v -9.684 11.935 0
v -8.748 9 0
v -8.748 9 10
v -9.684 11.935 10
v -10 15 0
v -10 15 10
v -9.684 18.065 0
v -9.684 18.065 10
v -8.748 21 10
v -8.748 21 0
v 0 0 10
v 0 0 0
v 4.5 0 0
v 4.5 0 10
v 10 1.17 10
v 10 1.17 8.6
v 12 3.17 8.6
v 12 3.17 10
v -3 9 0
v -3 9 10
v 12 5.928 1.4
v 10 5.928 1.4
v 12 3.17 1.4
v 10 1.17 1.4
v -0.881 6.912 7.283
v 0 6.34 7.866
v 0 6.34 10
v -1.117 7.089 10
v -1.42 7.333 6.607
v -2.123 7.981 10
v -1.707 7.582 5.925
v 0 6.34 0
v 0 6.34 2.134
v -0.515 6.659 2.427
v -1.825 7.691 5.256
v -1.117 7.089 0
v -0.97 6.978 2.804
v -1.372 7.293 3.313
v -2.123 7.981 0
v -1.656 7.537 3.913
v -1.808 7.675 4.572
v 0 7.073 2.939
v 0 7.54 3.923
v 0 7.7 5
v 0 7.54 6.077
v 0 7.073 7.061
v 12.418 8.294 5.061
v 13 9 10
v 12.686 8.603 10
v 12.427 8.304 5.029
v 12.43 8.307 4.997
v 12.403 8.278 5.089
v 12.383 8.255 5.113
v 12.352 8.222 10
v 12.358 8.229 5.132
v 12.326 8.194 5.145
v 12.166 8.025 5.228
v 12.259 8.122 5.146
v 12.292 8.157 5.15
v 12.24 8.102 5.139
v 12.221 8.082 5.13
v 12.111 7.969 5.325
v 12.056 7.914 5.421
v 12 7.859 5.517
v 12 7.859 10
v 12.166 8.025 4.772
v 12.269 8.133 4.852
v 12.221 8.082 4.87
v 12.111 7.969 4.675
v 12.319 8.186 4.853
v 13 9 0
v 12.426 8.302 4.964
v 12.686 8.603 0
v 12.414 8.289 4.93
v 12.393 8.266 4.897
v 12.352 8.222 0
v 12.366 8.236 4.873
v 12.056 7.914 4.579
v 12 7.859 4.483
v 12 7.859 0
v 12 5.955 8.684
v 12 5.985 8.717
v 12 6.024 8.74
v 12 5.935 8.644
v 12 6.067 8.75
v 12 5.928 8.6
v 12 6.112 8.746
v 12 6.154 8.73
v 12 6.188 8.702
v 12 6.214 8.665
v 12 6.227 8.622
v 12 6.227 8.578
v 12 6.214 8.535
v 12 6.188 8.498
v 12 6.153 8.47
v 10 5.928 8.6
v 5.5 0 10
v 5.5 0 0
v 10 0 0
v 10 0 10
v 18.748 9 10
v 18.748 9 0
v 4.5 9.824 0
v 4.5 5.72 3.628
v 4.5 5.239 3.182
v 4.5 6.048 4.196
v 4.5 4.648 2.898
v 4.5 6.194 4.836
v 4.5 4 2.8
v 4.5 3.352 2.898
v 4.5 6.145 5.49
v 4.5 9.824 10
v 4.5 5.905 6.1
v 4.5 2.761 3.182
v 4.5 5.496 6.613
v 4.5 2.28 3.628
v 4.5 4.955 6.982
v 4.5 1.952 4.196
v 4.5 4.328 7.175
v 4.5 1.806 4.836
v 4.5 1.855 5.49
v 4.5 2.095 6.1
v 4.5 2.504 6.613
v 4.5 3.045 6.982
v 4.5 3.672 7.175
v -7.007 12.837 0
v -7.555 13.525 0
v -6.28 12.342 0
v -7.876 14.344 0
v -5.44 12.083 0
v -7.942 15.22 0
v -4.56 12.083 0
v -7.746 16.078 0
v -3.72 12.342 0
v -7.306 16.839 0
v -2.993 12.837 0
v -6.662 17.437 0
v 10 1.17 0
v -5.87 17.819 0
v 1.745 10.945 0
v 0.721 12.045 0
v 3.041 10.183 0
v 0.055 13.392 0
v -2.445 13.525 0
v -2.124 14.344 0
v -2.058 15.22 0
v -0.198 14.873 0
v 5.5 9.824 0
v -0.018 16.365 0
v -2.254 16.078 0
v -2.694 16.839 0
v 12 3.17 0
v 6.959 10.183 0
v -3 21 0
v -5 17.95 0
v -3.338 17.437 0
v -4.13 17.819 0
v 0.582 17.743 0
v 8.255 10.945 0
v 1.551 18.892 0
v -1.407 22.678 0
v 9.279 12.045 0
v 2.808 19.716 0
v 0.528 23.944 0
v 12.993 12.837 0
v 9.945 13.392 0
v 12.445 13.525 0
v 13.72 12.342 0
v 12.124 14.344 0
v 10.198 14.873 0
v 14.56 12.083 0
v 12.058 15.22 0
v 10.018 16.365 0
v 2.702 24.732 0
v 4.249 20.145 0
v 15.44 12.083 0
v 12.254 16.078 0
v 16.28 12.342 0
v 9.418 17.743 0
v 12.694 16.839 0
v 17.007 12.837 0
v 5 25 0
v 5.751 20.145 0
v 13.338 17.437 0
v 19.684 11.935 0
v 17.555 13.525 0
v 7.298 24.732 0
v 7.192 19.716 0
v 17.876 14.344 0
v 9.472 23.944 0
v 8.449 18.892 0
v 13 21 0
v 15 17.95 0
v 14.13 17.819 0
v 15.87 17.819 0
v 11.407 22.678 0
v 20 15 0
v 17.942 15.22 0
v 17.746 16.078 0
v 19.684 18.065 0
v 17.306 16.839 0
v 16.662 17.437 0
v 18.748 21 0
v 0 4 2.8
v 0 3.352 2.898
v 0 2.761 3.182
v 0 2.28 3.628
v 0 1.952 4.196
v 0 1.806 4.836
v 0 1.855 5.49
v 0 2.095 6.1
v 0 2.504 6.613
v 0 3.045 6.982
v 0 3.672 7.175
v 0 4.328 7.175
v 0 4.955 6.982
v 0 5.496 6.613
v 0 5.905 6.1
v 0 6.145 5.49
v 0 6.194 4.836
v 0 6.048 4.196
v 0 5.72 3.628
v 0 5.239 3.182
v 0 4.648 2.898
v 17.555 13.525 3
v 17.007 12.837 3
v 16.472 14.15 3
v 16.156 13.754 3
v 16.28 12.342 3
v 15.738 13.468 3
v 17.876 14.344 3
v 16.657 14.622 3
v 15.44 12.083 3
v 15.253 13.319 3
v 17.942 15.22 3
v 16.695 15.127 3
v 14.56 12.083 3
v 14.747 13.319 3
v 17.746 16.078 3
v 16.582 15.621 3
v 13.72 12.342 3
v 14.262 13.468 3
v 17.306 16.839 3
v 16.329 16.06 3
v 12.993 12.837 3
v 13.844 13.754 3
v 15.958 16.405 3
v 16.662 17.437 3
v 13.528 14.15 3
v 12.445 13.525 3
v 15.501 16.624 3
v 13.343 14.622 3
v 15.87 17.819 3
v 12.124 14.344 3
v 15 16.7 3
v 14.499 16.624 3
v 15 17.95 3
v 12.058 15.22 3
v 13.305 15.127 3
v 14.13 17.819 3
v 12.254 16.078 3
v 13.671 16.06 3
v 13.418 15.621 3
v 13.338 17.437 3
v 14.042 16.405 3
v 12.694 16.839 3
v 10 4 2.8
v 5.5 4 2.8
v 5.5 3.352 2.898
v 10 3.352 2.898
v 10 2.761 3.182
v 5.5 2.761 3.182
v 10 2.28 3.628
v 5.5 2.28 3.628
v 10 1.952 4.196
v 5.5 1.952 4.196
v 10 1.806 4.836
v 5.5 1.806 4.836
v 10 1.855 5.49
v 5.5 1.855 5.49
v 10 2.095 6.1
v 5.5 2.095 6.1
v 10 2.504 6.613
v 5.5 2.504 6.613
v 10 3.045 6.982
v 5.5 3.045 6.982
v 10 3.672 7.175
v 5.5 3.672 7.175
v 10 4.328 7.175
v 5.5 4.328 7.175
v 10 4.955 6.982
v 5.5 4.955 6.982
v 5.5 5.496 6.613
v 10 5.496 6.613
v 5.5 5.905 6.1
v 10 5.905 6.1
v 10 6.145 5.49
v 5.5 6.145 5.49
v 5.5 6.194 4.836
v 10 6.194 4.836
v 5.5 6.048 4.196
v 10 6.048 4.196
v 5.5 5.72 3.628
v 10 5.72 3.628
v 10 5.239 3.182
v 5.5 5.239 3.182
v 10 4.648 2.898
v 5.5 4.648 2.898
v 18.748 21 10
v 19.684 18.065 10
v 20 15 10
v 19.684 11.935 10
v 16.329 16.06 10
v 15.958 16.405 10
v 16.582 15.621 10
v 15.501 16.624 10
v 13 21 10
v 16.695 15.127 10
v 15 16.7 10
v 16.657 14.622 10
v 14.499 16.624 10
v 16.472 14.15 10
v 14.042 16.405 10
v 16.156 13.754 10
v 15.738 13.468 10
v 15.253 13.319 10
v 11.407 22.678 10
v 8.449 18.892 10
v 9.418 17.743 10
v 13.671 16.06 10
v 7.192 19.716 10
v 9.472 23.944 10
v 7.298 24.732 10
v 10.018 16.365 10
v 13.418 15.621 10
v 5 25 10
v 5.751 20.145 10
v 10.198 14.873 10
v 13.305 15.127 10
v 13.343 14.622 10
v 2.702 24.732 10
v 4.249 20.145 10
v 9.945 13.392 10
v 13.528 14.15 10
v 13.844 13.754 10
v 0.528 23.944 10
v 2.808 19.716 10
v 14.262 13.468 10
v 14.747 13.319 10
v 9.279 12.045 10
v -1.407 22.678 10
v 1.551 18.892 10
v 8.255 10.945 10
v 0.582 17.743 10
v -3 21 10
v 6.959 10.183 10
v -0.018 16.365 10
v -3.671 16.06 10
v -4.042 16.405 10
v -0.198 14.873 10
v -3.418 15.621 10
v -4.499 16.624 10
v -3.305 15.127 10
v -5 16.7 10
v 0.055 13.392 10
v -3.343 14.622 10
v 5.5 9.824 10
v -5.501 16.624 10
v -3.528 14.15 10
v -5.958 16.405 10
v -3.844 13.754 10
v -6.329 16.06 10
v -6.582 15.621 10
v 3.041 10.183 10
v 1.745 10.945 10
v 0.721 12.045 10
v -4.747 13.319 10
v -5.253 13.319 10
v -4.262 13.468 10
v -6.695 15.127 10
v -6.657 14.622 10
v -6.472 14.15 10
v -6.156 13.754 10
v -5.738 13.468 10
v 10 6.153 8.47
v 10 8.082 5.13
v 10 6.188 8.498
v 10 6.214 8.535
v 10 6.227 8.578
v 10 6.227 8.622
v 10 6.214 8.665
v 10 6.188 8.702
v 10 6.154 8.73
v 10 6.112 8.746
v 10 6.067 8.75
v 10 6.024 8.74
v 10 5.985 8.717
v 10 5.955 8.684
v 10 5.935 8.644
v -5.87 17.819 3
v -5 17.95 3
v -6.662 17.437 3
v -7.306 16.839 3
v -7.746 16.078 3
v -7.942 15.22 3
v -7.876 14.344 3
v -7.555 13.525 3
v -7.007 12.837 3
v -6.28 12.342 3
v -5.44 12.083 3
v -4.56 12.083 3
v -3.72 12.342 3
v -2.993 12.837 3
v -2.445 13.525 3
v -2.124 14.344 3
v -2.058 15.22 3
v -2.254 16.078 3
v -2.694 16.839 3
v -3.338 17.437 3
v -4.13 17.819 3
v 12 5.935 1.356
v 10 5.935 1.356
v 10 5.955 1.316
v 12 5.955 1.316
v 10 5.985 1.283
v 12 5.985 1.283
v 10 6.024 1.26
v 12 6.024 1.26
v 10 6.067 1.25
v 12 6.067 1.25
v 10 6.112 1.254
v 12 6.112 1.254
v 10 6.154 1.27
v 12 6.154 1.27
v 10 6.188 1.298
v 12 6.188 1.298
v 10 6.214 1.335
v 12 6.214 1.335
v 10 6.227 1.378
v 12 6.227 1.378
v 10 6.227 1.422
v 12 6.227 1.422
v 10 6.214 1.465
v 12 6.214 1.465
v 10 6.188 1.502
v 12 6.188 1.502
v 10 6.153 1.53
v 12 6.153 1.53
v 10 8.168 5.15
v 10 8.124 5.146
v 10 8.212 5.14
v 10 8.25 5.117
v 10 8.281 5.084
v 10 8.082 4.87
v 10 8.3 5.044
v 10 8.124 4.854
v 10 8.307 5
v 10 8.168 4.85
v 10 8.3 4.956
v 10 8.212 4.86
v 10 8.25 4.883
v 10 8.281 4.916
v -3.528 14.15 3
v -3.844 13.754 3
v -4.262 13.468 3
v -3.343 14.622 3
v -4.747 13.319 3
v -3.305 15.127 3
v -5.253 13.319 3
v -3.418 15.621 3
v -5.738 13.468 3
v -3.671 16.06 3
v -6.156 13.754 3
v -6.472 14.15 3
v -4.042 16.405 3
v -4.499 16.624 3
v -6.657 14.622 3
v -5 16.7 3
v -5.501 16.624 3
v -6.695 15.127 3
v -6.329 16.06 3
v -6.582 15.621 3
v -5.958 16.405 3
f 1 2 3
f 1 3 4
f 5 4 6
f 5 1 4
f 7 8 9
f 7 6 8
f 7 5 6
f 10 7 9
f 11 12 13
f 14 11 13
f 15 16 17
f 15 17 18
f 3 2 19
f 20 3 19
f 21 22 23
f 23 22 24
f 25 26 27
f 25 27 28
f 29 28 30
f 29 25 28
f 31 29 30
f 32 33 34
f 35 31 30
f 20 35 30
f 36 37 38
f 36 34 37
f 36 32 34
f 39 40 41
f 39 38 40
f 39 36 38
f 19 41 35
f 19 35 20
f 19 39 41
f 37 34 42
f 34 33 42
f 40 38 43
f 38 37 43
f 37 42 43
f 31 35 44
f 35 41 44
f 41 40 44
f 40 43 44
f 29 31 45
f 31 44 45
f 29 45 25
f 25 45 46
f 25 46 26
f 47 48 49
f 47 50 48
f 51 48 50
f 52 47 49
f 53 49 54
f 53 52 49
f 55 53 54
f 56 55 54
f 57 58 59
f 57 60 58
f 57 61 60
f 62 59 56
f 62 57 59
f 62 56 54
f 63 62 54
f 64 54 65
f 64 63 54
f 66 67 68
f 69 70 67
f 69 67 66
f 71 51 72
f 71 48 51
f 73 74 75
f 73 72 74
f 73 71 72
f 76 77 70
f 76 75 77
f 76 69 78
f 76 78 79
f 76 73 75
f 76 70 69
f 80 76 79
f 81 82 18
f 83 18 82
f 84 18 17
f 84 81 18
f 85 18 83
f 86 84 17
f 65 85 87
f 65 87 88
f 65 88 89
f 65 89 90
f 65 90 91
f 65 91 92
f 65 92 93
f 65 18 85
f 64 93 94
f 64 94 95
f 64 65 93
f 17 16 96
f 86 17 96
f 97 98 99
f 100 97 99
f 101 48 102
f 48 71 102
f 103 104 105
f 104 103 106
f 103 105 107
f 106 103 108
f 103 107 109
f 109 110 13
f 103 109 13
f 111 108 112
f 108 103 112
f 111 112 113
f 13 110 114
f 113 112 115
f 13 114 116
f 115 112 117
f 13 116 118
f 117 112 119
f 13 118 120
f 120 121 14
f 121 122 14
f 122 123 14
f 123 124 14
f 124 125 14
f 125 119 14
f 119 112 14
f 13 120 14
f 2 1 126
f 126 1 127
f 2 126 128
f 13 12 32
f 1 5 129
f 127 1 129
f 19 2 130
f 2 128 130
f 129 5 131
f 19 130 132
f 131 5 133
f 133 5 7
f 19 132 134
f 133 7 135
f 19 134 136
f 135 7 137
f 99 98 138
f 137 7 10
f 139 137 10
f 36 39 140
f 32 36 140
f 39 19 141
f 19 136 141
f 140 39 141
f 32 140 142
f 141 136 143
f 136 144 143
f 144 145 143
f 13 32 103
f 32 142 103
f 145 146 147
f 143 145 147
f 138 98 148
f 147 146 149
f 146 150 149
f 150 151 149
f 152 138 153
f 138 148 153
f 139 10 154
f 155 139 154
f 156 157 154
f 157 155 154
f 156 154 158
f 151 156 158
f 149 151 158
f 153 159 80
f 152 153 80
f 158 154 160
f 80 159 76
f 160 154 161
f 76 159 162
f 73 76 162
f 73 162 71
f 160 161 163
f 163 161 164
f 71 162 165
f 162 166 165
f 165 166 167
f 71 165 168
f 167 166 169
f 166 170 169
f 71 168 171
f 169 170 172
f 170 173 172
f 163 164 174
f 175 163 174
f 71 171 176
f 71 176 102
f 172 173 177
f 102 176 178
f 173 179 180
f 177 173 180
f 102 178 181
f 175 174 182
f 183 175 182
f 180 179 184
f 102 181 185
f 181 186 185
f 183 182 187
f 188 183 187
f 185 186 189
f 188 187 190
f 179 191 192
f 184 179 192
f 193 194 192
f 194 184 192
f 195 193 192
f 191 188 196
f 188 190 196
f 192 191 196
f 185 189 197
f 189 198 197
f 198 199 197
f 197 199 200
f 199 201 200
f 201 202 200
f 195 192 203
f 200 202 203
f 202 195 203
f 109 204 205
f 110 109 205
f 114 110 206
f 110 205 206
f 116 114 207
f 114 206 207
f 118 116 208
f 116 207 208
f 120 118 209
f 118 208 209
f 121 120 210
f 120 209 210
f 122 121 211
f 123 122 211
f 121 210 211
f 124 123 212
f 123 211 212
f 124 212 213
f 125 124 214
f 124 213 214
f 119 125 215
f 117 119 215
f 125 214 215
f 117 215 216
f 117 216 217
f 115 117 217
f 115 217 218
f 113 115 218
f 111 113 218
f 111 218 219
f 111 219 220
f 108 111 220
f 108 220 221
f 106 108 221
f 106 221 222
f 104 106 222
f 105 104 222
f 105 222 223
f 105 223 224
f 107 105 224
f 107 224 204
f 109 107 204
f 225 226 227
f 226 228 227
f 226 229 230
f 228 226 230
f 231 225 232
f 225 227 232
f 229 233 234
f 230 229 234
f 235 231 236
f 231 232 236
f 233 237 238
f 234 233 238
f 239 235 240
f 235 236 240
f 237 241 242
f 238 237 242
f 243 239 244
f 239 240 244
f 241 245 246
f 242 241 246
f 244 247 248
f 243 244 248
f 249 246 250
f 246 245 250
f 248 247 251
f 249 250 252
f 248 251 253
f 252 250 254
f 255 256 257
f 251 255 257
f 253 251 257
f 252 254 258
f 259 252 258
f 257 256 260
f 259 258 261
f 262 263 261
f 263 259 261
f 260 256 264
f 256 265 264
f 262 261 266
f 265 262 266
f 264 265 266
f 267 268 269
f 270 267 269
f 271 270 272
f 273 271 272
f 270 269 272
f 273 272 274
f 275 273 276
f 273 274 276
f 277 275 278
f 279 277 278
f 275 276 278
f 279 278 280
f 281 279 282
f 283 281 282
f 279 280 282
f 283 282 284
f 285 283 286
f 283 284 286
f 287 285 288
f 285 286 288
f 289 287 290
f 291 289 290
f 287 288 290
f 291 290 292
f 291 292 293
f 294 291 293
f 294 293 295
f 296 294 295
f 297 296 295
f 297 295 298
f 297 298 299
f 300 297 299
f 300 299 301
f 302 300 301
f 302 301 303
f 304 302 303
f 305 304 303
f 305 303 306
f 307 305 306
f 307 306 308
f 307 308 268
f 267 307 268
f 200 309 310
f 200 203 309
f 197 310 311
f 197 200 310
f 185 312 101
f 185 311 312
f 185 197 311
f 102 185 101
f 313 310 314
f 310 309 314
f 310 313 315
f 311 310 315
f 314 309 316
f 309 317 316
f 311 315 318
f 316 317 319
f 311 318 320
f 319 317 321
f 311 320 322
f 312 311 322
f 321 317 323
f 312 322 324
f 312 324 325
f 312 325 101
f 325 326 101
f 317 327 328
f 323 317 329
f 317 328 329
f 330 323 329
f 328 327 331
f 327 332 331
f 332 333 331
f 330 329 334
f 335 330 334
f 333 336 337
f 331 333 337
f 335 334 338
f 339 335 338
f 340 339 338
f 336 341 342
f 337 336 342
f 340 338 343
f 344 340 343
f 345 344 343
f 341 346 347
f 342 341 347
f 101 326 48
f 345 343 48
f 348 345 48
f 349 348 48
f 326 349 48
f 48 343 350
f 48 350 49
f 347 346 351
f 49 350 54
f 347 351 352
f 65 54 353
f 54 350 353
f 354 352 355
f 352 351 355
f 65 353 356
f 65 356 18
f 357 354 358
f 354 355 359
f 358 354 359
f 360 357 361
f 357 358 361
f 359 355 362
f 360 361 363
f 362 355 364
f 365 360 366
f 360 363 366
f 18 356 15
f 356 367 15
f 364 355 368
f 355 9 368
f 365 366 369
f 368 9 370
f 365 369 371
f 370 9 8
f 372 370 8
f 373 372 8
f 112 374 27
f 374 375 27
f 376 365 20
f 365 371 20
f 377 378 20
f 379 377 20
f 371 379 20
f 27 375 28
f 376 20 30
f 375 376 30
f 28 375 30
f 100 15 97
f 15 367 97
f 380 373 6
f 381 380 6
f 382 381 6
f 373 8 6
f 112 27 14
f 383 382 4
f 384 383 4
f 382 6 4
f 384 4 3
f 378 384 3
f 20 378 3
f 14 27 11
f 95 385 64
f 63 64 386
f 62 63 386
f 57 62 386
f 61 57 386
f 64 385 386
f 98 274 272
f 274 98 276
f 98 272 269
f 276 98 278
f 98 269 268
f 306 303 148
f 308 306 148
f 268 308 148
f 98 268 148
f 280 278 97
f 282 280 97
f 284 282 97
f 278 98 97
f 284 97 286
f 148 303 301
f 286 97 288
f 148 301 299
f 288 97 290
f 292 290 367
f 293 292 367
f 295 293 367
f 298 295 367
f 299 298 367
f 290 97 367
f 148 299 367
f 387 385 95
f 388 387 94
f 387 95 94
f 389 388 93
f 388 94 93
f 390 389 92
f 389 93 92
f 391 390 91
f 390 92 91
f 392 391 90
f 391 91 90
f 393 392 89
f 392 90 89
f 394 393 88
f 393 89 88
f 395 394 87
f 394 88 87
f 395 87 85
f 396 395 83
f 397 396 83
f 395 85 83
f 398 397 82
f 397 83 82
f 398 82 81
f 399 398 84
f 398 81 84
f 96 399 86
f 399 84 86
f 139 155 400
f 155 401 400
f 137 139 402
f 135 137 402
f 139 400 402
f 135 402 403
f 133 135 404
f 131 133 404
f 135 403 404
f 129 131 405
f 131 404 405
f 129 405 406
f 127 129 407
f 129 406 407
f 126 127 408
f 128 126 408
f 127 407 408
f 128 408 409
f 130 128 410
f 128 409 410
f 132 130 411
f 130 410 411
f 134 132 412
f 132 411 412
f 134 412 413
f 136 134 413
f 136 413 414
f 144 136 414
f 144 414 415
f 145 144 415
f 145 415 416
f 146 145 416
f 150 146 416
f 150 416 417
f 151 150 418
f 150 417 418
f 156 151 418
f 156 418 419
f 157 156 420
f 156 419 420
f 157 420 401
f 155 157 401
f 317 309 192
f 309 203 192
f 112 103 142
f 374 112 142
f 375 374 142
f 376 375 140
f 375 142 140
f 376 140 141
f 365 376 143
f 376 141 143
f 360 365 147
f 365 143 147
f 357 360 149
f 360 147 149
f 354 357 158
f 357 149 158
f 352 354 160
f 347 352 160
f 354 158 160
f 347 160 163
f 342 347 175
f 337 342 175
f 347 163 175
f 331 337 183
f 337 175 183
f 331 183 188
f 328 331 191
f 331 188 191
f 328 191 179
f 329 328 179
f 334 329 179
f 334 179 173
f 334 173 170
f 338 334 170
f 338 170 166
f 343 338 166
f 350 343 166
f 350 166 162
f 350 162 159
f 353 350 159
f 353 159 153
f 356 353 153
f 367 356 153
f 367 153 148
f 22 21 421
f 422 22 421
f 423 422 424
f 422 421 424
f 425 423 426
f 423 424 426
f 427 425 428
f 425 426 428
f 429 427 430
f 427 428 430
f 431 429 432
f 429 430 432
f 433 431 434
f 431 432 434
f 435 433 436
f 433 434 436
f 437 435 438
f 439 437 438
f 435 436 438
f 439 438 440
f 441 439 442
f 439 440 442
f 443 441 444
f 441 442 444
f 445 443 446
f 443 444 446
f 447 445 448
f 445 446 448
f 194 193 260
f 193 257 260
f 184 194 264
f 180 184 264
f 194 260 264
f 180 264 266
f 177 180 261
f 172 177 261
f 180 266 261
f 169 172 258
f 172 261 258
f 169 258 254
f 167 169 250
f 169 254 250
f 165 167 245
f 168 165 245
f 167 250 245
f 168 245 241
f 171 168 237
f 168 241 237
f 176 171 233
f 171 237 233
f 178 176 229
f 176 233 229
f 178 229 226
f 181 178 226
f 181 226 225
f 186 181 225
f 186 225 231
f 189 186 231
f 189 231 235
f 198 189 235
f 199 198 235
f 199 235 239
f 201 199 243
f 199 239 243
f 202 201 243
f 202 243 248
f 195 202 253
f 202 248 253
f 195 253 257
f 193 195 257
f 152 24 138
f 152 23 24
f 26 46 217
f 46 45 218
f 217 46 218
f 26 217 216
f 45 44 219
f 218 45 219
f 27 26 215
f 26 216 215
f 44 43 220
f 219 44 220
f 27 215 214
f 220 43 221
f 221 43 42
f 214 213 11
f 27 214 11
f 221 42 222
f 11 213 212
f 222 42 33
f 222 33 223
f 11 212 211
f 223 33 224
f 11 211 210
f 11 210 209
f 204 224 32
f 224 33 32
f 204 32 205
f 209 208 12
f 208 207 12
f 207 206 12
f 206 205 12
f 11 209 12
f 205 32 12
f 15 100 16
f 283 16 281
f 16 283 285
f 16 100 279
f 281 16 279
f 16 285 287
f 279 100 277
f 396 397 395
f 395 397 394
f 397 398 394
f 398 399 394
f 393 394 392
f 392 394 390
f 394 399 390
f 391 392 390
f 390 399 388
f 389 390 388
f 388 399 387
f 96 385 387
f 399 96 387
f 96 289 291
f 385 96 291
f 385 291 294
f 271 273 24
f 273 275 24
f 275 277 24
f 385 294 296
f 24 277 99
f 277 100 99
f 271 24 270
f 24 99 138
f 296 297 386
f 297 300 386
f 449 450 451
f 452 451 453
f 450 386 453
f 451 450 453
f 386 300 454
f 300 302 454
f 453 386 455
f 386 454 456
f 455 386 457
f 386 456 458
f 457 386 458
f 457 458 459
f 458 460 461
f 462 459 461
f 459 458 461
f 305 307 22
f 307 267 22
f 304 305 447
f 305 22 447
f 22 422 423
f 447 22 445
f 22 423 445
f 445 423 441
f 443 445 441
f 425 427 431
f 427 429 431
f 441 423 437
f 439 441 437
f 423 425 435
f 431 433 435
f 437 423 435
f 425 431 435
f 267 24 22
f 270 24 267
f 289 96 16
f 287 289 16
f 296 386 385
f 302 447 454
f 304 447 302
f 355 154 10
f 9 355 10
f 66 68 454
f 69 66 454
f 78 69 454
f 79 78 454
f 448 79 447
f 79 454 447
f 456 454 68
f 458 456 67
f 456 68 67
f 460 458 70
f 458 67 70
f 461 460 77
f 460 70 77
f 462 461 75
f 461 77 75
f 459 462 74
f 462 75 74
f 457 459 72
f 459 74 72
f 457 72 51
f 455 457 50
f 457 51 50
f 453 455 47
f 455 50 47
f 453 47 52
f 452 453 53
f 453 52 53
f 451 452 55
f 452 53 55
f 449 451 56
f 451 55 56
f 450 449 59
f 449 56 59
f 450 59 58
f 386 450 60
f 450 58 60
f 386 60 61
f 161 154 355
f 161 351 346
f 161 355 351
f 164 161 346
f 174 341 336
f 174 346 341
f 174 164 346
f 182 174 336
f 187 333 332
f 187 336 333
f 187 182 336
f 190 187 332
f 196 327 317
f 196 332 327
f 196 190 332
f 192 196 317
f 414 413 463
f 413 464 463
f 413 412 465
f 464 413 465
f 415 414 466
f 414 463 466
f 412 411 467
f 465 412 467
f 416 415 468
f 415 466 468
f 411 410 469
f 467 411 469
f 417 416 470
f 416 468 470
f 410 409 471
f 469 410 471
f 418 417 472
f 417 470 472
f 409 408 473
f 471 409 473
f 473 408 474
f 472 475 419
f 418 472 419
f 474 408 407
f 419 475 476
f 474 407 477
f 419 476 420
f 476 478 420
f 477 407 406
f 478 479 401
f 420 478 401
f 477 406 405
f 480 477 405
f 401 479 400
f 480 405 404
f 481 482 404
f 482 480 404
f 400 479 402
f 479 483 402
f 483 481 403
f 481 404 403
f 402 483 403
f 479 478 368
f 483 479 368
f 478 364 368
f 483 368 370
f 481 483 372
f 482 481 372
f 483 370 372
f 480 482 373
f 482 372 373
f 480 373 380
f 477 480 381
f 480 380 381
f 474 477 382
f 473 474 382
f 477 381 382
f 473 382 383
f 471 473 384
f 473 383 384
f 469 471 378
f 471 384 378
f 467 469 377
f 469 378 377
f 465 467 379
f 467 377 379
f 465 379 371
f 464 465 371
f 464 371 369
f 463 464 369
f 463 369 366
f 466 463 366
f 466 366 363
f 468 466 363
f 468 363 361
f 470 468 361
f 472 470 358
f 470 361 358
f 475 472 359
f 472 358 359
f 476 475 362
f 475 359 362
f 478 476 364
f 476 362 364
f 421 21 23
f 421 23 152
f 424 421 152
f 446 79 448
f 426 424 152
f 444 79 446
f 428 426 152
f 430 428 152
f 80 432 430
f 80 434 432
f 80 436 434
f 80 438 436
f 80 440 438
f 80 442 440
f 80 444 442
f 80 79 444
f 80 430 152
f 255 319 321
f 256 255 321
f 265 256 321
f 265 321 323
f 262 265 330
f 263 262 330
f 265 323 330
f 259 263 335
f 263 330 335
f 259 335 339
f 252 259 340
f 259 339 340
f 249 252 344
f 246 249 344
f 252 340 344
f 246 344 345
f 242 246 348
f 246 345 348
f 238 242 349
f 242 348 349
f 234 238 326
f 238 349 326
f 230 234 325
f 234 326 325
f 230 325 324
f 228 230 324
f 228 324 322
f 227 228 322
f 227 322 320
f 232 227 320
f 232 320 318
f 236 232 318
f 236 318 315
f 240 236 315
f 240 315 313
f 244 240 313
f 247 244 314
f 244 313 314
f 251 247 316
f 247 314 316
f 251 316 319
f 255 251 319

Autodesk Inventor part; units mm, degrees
ref_plane "YZ Plane" through (0, 0, 0) normal (1, 0, 0) x (0, 1, 0)
ref_plane "XZ Plane" through (0, 0, 0) normal (0, 1, 0) x (-1, 0, 0)
ref_plane "XY Plane" through (0, 0, 0) normal (0, 0, 1) x (1, 0, 0)
sketch "スケッチ1" plane through (0, 0, 0) normal (0, 0, 1) x (1, 0, 0)
  line L0 (0, 0) -> (10, 0)
  line L1 (10, 0) -> (10, 15)
  line L2 (10, 15) -> (0, 15)
  line L3 (0, 15) -> (0, 0)
  circle A0 centre (5, 15) radius 10
  circle A1 centre (5, 15) radius 15
  line L4 (-8.7477, 9) -> (18.7477, 9)
  line L5 (18.7477, 9) -> (18.7477, 21)
  line L6 (18.7477, 21) -> (-8.7477, 21)
  line L7 (-8.7477, 21) -> (-8.7477, 9)
  line L8 (-8.7477, 9) -> (18.7477, 21) construction
  line L9 (18.7477, 9) -> (-8.7477, 21) construction
  point P0 (0, 6.3397)
  point P1 (10, 6.3397)
  point P2 (-8.7477, 9)
  point P3 (-3, 9)
  point P4 (-3, 21)
  point P5 (-8.7477, 21)
  point P6 (13, 21)
  point P7 (13, 9)
  point P8 (18.7477, 9)
  point P9 (10, 9)
  point P10 (0, 9)
  point P11 (-8.7477, 9)
  point P12 (-8.7477, 21)
  point P13 (18.7477, 9)
  point P14 (10, 0.8579)
  point P15 (0, 0.8579)
  point P16 (5, 0)
  dimension "d41" = 30
  dimension "d0" = 15
  dimension "d1" = 20
  dimension "d27" = 10
  dimension "d28" = 5
  dimension "d42" = 12
extrude "押し出し1" add sketch "スケッチ1" along normal blind 10 contours L3 A1 L0 | A1 L1 L0 | A1 L3 A0 L1 | A0 L4 L3 | L3 L4 L1 A0 | L7 L6 A0 L4 | A1 L7 | L1 L4 A0 | L5 A1 | L4 A0 L6 L5 | L4 A0 L6 L1 L2 L3 | L3 L2 L1 L4 | A0 L6
sketch "スケッチ2" plane through (0, 0, 10) normal (0, 0, 1) x (1, 0, 0)
  arc A0 (10, 6.3397) -> (0, 6.3397) centre (5, 15) ccw projected
  point P0 (0, 0)
  point P1 (5, 15)
hole "穴1" at (5, 15, 10) direction (0, 0, -1) diameter 10.4 end through all
sketch "スケッチ3" plane through (0, 0, 10) normal (0, 0, 1) x (1, 0, 0)
  line L0 (0, 0) -> (10, 0) projected
  line L1 (4.5, 0) -> (5.5, 0)
  line L2 (5.5, 0) -> (5.5, 15)
  line L3 (5.5, 15) -> (4.5, 15)
  line L4 (4.5, 15) -> (4.5, 0)
  line L5 (0, 6.3397) -> (0, 0) projected
  circle A0 centre (5, 15) radius 5.2 projected
  point P0 (5, 0)
  point P1 (5, 0)
  dimension "d14" = 1
extrude "押し出し2" cut sketch "スケッチ3" against normal up to surface (10 mm away) contours L4 A0 L2 L0 | L4 L3 L2 A0 picked at (5.0556, 13.2676)
sketch "スケッチ4" plane through (10, 0, 0) normal (1, 0, 0) x (0, 0, -1)
  circle A0 centre (-5, 4) radius 1.5
  line L0 (0, 0) -> (-10, 0) projected
  line L1 (0, 0) -> (0, 6.3397) projected
  line L2 (-5, 0) -> (-5, 10)
  point P0 (0, 10)
  dimension "d17" = 4
  dimension "d19" = 3
hole "穴2" at (10, 4, 5) direction (-1, 0, 0) diameter 4.4 end through all
sketch "スケッチ7" plane through (10, 0, 0) normal (1, 0, 0) x (0, 0, -1)
  circle A0 centre (-5, 4) radius 2.2 projected
  line L0 (-5, 8.1569) -> (-1.4, 6.0785)
  line L1 (-1.4, 6.0785) -> (-1.4, 1.9215)
  line L2 (-1.4, 1.9215) -> (-5, -0.1569)
  line L3 (-5, -0.1569) -> (-8.6, 1.9215)
  line L4 (-8.6, 1.9215) -> (-8.6, 6.0785)
  line L5 (-8.6, 6.0785) -> (-5, 8.1569)
  line L6 (-10, 9.8241) -> (-10, 0) projected
  line L7 (0, 0) -> (0, 6.3397) projected
  line L8 (-10, 9.8241) -> (0, 9.8241)
  line L9 (0, 9.8241) -> (0, 3.1699)
  line L10 (0, 3.1699) -> (-10, 3.1699)
  line L11 (-10, 3.1699) -> (-10, 9.8241)
  point P0 (-1.4, 3.1699)
  point P1 (0, 6.3397)
  point P2 (-8.6, 3.1699)
  point P3 (-7.0374, 3.1699)
  point P4 (-2.9626, 3.1699)
  dimension "d35" = 7.2
extrude "押し出し5" add sketch "スケッチ7" along normal blind 2 contours L10 L6 L8 L9 L7 L1 L0 L5 L4
chamfer "面取り1" distance 2 angle 45 2 edges at (10, 3.1699, 9.3) (10, 3.1699, 0.7)
sketch "スケッチ8" plane through (0, 0, 0) normal (0, 0, -1) x (-1, 0, 0)
  circle A0 centre (-5, 15) radius 10 construction
  arc A1 (-4.5, 9.8241) -> (-5.5, 9.8241) centre (-5, 15) ccw construction
  point P0 (0, 0)
  point P1 (5, 15)
  point P2 (-15, 15)
  dimension "d44" = 20
hole "穴3" at (-5, 15, 0) at (15, 15, 0) direction (0, 0, 1) diameter 3.4 end through all counterbore diameter 5.9 counterbore depth 3
extrude "押し出し7" cut sketch "スケッチ7" along normal through all contours A0 L10 L4 L5 L0 L1
sketch "スケッチ10" plane through (0, 6.3397, 0) normal (-1, 0, 0) x (0, 0, 1)
  circle A0 centre (5, -2.3397) radius 2.2 projected
  circle A1 centre (5, -2.3397) radius 3.7
  point P0 (0, -6.3397)
  dimension "d57" = 7.4
extrude "押し出し8" cut sketch "スケッチ10" along normal blind 10
hole "穴4" at (10, 6.0785, 8.6) at (10, 6.0785, 1.4) at (10, 8.1569, 5) direction (1, 0, 0) diameter 0.3 end through all
equation "\"d28\" = 0.5 * d27"
properties part number "軸止め" material "ABS プラスチック"
